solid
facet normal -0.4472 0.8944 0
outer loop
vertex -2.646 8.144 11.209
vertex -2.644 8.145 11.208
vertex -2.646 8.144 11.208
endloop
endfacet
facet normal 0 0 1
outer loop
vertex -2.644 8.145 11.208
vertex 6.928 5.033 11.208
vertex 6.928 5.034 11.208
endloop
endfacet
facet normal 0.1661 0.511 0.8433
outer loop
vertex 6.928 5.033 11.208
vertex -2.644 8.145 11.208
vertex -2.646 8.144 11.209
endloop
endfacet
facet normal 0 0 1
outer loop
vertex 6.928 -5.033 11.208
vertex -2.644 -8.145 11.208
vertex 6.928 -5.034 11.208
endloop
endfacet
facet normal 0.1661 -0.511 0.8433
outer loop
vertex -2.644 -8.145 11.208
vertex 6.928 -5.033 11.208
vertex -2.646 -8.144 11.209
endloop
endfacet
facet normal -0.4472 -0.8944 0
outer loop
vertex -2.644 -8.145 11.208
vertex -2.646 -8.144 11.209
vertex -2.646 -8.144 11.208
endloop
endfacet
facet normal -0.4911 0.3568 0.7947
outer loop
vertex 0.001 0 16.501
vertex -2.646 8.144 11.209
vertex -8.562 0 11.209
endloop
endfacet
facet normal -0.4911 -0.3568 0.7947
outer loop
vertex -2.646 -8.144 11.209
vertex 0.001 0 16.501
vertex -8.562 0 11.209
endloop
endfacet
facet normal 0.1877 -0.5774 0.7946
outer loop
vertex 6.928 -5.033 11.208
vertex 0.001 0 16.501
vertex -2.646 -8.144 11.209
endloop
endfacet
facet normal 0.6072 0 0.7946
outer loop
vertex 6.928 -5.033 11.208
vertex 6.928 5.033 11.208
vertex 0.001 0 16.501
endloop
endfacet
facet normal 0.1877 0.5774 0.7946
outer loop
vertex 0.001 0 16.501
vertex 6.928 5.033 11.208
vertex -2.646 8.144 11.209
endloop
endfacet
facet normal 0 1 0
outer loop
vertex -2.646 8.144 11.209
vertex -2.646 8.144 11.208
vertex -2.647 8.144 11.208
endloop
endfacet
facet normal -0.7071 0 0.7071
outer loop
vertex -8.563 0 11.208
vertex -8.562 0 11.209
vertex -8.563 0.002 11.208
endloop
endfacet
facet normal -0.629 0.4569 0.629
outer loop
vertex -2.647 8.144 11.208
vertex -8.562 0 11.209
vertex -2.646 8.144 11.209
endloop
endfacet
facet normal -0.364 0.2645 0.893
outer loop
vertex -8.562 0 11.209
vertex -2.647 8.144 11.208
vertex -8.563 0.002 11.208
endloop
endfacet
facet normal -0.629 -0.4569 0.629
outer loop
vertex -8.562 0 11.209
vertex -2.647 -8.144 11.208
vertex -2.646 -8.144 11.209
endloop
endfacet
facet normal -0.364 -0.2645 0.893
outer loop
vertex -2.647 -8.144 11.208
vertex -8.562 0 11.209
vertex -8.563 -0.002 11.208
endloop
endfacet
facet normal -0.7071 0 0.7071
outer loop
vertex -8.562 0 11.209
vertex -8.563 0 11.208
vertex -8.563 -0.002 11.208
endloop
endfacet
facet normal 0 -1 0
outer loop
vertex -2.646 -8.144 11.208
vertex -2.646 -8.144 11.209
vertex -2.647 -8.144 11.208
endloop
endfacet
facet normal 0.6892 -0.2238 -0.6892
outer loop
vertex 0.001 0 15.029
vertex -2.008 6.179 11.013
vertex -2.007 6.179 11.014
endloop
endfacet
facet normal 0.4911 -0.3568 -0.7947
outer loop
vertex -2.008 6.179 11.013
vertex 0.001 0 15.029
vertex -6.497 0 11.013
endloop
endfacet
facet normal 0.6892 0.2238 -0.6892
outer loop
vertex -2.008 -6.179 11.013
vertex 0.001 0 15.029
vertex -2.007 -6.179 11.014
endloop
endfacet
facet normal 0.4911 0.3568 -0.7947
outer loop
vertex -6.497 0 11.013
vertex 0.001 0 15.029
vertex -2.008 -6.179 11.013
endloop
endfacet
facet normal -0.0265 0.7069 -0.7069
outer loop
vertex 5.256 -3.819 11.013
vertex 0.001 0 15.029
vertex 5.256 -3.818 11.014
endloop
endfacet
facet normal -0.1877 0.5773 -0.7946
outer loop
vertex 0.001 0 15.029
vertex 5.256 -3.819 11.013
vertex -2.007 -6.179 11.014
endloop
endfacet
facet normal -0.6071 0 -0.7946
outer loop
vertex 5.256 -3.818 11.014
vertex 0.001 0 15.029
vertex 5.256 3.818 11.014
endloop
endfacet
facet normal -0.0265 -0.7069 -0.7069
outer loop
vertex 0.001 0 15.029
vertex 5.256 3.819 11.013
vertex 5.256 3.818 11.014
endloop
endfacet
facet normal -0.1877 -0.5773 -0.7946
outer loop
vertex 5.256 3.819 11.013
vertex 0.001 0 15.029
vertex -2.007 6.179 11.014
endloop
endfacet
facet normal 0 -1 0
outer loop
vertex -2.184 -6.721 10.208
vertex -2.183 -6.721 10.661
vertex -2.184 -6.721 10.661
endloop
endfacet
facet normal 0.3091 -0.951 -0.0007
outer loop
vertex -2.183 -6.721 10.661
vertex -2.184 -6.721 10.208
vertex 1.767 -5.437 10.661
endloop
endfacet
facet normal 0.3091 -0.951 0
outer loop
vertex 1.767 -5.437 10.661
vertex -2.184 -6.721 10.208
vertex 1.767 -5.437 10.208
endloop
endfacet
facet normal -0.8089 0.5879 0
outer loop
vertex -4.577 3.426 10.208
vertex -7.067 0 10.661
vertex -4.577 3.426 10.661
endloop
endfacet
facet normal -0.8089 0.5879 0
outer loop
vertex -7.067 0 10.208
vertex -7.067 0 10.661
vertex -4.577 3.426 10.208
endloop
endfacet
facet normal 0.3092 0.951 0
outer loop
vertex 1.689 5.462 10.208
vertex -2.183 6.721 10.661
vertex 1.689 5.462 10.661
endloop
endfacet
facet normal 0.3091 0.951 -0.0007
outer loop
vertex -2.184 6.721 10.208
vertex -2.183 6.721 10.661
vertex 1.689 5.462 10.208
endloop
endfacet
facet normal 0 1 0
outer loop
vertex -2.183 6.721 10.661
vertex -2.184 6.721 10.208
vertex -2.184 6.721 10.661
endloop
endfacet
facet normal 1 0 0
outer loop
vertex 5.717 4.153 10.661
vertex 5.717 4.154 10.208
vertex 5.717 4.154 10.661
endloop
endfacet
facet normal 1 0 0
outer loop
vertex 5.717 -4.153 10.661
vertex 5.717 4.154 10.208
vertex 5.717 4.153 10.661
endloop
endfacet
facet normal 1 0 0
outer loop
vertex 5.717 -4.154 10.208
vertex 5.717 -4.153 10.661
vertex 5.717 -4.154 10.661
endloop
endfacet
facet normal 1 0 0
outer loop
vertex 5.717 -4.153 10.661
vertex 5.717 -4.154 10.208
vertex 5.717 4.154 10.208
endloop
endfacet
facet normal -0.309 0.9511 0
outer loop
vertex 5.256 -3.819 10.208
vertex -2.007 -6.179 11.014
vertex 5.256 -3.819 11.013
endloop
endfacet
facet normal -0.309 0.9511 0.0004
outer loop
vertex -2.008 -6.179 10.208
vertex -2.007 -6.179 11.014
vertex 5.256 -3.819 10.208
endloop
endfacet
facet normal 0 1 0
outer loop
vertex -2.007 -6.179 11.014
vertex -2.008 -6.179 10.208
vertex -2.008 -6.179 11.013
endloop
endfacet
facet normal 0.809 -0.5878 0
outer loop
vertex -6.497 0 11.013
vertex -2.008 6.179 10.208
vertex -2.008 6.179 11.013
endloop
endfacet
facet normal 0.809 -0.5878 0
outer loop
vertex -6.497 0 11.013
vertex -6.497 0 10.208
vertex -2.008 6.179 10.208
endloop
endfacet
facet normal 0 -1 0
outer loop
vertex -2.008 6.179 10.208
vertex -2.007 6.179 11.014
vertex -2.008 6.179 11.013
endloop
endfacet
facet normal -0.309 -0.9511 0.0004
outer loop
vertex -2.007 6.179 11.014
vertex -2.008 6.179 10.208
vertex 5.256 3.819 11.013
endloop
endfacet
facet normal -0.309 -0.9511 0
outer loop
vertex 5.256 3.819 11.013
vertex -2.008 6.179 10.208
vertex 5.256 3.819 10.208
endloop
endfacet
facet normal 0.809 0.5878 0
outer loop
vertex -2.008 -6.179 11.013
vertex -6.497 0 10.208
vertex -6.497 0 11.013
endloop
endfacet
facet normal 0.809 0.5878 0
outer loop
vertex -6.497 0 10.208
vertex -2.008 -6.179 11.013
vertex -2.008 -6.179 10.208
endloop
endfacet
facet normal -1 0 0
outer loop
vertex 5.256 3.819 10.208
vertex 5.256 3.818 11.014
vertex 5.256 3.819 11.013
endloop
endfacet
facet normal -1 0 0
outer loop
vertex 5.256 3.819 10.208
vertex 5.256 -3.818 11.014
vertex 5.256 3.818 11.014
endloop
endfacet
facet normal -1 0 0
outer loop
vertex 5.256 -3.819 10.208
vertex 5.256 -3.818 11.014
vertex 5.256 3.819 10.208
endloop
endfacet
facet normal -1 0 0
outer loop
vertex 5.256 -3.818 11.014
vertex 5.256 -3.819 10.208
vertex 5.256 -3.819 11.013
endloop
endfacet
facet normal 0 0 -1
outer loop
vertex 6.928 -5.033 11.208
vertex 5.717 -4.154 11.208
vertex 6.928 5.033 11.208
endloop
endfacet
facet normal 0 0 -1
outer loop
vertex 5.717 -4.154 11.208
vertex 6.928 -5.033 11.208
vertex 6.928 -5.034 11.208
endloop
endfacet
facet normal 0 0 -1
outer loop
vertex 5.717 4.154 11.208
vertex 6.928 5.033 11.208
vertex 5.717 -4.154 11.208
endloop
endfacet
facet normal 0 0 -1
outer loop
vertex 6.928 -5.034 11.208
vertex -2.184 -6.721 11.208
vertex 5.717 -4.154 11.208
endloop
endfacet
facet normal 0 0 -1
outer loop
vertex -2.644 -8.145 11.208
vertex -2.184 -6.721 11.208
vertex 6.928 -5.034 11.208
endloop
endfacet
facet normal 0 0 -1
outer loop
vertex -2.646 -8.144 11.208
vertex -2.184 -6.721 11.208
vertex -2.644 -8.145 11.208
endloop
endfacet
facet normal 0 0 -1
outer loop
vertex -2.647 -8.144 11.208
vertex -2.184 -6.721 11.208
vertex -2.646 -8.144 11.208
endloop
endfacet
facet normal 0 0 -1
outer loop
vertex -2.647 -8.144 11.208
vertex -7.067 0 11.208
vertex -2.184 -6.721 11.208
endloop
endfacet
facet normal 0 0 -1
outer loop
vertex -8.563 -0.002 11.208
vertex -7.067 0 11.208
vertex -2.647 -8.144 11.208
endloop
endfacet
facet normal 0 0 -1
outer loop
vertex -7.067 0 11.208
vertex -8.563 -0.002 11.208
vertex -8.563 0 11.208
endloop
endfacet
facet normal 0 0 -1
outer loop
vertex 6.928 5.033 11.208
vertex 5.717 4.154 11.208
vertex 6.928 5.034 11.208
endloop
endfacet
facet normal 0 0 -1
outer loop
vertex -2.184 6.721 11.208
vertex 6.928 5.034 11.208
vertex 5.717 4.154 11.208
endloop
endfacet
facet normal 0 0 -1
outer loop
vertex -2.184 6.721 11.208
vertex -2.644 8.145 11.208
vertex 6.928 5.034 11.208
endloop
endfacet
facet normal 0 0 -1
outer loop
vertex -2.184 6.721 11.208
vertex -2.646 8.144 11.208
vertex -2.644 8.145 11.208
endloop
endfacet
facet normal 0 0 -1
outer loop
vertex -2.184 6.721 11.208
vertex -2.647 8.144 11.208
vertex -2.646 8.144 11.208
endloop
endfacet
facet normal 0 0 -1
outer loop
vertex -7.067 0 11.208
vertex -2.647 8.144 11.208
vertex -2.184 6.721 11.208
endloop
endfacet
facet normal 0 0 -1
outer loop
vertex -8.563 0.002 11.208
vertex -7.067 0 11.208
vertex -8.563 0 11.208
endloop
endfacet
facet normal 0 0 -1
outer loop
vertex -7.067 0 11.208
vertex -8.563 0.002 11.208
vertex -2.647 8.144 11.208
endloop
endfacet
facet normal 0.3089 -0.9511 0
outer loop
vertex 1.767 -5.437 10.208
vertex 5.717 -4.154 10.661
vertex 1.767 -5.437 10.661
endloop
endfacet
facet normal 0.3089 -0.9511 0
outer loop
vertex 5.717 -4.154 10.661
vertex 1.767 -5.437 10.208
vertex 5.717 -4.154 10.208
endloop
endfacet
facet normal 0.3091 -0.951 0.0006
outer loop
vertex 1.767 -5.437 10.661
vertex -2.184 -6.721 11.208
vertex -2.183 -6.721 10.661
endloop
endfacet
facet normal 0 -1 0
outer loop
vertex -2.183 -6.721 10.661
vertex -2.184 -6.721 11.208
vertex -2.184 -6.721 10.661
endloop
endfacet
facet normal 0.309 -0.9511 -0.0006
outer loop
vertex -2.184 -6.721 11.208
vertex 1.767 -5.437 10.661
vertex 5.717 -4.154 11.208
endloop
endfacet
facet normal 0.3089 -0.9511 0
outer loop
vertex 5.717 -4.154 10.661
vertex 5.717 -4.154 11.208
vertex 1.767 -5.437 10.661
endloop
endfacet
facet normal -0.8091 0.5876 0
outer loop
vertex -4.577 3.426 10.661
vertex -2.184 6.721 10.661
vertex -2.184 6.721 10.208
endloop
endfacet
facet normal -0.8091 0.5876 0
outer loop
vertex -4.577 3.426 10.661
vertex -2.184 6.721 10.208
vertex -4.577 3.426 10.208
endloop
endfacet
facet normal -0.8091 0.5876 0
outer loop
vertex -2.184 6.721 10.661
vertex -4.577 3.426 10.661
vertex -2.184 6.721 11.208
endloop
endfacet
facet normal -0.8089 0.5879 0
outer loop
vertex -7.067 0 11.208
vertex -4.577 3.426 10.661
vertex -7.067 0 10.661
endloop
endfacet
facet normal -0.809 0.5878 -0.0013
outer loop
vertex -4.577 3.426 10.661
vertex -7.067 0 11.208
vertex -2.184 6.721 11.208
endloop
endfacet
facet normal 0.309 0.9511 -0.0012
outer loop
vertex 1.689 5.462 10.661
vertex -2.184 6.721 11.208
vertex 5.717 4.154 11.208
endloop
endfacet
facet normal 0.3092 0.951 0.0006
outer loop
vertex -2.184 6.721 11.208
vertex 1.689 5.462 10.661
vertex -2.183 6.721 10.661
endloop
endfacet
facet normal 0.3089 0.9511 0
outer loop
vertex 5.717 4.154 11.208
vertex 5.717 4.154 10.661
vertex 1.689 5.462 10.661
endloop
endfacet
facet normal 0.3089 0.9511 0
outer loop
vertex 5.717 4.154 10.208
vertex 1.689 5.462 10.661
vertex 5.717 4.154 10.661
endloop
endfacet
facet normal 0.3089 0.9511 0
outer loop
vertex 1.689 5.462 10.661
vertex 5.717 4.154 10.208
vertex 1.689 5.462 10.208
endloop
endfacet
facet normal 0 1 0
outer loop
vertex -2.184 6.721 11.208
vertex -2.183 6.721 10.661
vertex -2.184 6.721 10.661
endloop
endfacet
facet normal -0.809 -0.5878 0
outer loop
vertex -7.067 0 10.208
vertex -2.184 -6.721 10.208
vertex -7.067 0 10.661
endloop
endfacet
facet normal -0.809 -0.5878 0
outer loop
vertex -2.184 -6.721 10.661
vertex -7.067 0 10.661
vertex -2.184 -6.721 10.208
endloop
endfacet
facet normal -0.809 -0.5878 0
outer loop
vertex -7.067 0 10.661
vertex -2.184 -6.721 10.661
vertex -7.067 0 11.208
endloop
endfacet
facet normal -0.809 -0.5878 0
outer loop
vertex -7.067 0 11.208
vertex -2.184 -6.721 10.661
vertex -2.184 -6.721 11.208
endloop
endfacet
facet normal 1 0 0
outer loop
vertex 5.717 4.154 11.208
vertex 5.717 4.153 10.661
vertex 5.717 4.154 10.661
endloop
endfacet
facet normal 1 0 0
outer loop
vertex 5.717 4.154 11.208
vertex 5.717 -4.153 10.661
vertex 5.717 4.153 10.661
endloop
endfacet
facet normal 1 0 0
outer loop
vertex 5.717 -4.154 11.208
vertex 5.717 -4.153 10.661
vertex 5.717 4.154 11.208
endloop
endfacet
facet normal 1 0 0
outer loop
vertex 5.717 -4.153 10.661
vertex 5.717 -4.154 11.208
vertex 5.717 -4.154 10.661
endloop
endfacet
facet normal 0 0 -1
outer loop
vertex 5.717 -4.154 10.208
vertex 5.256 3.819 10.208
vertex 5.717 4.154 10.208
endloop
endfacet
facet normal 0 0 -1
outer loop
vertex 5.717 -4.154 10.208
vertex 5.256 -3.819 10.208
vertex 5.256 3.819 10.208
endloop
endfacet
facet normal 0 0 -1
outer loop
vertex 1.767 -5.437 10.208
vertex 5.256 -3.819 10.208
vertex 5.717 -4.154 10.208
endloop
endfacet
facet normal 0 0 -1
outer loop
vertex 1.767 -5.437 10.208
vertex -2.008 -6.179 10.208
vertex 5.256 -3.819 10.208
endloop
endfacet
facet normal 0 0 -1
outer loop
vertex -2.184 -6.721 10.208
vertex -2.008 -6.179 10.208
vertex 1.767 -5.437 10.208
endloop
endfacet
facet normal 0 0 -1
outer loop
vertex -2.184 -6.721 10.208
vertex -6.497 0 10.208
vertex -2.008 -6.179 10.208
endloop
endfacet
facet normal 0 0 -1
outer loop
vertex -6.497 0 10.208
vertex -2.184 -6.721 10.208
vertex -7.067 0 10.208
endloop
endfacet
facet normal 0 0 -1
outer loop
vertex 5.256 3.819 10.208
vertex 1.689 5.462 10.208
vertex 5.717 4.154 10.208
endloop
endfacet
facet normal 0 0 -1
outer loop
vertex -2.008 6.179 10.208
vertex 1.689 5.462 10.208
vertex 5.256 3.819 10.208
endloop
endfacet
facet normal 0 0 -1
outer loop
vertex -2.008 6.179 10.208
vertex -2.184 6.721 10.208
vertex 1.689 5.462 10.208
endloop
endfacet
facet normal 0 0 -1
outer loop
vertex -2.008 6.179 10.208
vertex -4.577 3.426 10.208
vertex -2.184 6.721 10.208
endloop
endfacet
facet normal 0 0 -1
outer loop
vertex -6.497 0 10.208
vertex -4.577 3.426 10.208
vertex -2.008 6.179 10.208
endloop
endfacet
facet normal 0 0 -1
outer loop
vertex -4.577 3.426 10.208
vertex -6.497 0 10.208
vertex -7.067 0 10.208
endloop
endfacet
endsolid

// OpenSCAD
//arete = 21.409;
diameter = 33;
creux = 1; // creux ou plein || 1 ou 0
paroi = 1;
echelleReductionAjustementBouchon = 0.972;
bouchon = 1; // 1 ou 0
corps = 0; // 1 ou 0
rotate_body = 0;
bottom_hole = 1; // 1 ou 0
bottom_hole_diameter = 1.5;
bouchonOffset = 0.4;
r = 0.19; // résolution d'impression sur l'axe Z

// Controle rotation viewport quand animation en route
//$vpr = [70, 0, $t * 180];

/* Forme
Choix parmi:
- 0 => Etoilé
- 1 => Christique
- 2 => Christique_inversé
- 3 => Pentakis // (all points on sphere)
- 4 => Animate // voir plus bas pour plus d'infos
*/
forme_ID = 1;

/////////

function dodeca_ext_radius(a) = 
    a/2*(sqrt(2));
    
function dodeca_inradius(a) = 
    a*sqrt(5/8+11/(8*sqrt(5)));
    
function dodeca_arete_from_inradius(radius) = 
    radius/sqrt(5/8+11/(8*sqrt(5)));
    
function christic_arete_from_external_diameter(diam) =
    diam/(sqrt((5/2)+(11/10)*sqrt(5))+2*sqrt((5-sqrt(5))/10));

// rayon cercle inscrit
function polygon_apothem(arete, sides) =
  arete/(2*tan(180/sides));
  
function polygon_apothem_from_circumradius(circumradius, sides) =
  circumradius*cos(180/sides);
  
function polygon_circumradius_from_apothem(apothem, sides) =
  apothem/cos(180/sides);

arete = christic_arete_from_external_diameter(diameter);
areteInt = dodeca_arete_from_inradius(
            dodeca_inradius(arete)-paroi);
dodeca_inradius = dodeca_inradius(arete);

decoupe_bouchon_radius = polygon_circumradius_from_apothem(
                          polygon_apothem(arete, 5) - paroi+1*r, 
                          5);
bouchon_radius = polygon_circumradius_from_apothem(
                          polygon_apothem(arete, 5) - paroi+1*r - bouchonOffset, 
                          5);

echo("arete: ", arete);
echo("arete int: ", areteInt);
echo(str("dodeca_inradius : ", dodeca_inradius));
echo(str("decoupe_bouchon_radius : ", decoupe_bouchon_radius));
echo(str("bouchon_radius : ", bouchon_radius));

spike = [
    2.3417, // Etoilé, scale 1 is arete = 1.236 mm, diametre = 6.24 mm, arete pyramide = 2 mm
    0.8944, // Christique, scale 1 is arete = 1.236 mm, diametre = 4.05 mm
    -0.8944, // Christique inversé
    0.4279 // Pentakis
];

if (forme_ID == 4) {
    Animate();
} else {  
    if (creux == 0) {
        small_stellated_dodecahedron(spike[forme_ID], small_stellated_dodecahedron);
    } else {
        if (corps == 1) {
          if (rotate_body == 1) {
            rotate([180, 0, 0]) corps_ouvert();
          } else {
            corps_ouvert();
          }
        }
        if (bouchon == 1) {
            bouchon();
        }
    }
}


module corps_ouvert() {

	difference() {
		poly_creux();
		decoupe_bouchon(decoupe_bouchon_radius);
    if (bottom_hole == 1) {
        bottom_hole();
    }
	}
}

module poly_creux() {
    difference() {
        small_stellated_dodecahedron(spike[forme_ID], arete);
        small_stellated_dodecahedron(spike[forme_ID], areteInt);
    }
}

module decoupe_bouchon(radius) {
	rotate([0,0,36]) translate([0,0, dodeca_inradius])
		cylinder(99, r=arete*0.853, $fn=5, center=false);
	rotate([0,0,36]) translate([0,0, dodeca_inradius-paroi])
		#cylinder(paroi, r=radius, $fn=5, center=false);
}

module supplement_feuillure_bouchon() {
    rotate([0,0,36]) translate([0,0, dodeca_inradius-paroi-1])
    difference() {   
		cylinder(paroi+1, r=bouchon_radius, $fn=5, center=false);
		cylinder(paroi+1, r=bouchon_radius-3*r, $fn=5, center=false);
    }
}

module bouchon() {
	difference () {
        intersection() {
            union() {
                poly_creux();
                supplement_feuillure_bouchon();
            }
            decoupe_bouchon(bouchon_radius);
        }
	}
}

module bottom_hole() {
	rotate([0,0,0]) translate([0,0, -dodeca_inradius])
		#cylinder(dodeca_inradius, d=bottom_hole_diameter, $fn=20, center=true);
}

// }}

/*
animates the single parameter of the
module small_stellated_dodecahedron

1/ choose animate in the view menu
2/ sets fps to an appropiate number for
your machine - 20 is good
3/ set steps to a number that keeps the
change from happening too slowly or
too fast - 200 is good
*/
module Animate() {
    small_stellated_dodecahedron(-3.4317*abs(2*$t-1)+2.4317);
}

// Étoilé
// scale 1 is arete = 1.236 mm, diametre = 6.24 mm, arete pyramide = 2 mm
module Etoile(a) {
    small_stellated_dodecahedron(2.3417, a);
}

// Christique
// scale 1 is arete = 1.236 mm, diametre = 4.05 mm
module Christique(a) {
    small_stellated_dodecahedron(0.8944, a);
}

// Christique inversé
module Christique_inv(a) {
    small_stellated_dodecahedron(-0.8944, a);
}

// Pentakis (all points on sphere)
module Pentakis(a) {
    small_stellated_dodecahedron(0.4279, a);
}

module small_stellated_dodecahedron(scale, ar)
{
a=scale*0.61803;
b=scale*0.38197;
    
length = ar ? ar : arete;
echo("length:", length);
// scale(1) => arete 1.236 mm
scale(length/1.236)

// Posé sur 3 pointes
//rotate([20.91, 0, 0])

// Posé sur 1 pointe
rotate([0, 31.72, 0])

/*
constructed from 12 pentagonal pyramids placed
on the faces of a dodecahedron.
first 20 points are the vertices of a dodecahedron
next 12 points are the vertices of the centers
of the faces of the dodecahedron

if scale = 0 a dodecahedron is created

if scale is positive the centers of the
faces are moved out fron the center of the
dodecahedron

if scale is negative the centers of the
faces are moved in towards the center of the
dodecahedron

the apex angles of the triangles that make up
the faces of the stellated dodecahedron
are 36 degrees - the scale factor that
makes a small stellated dodecahedron
is approximately 2.3417
length of side of pentagonal pyramid for
small stellated dodecahedron = 2

the apex angles of the triangles that make up
the faces of a pentakis dodecahedron ( one of
the Catalan solids) are about 68.619 degrees
the scale factor to make one is ca 0.4279

if len = length of the sides of the
pentagonal pyramid then approximately

scale = + or - sqrt((len*len/0.52786) - 2.09443)

lengths of the sides of the base are sqrt(5)-1
or 1.23607 to make equilateral triangles scale
factor is 0.8944

distance from centers of faces to origin ca 1.37638
distance from dodecahedral points to origin sqrt(3)




pcm

*/

polyhedron
       (points = [
                 [   1.00000,   1.00000,   1.00000],
                 [   1.00000,   1.00000,  -1.00000],
                 [   1.00000,  -1.00000,   1.00000],
                 [   1.00000,  -1.00000,  -1.00000],
                 [  -1.00000,   1.00000,   1.00000],
                 [  -1.00000,   1.00000,  -1.00000],
                 [  -1.00000,  -1.00000,   1.00000],
                 [  -1.00000,  -1.00000,  -1.00000],
                 [   0.00000,   0.61803,   1.61803],
                 [   0.00000,   0.61803,  -1.61803],
                 [   0.00000,  -0.61803,   1.61803],
                 [   0.00000,  -0.61803,  -1.61803],
                 [   0.61803,   1.61803,   0.00000],
                 [   0.61803,  -1.61803,   0.00000],
                 [  -0.61803,   1.61803,   0.00000],
                 [  -0.61803,  -1.61803,   0.00000],
                 [   1.61803,   0.00000,   0.61803],
                 [   1.61803,   0.00000,  -0.61803],
                 [  -1.61803,   0.00000,   0.61803],
                 [  -1.61803,   0.00000,  -0.61803],
                 [   1.17082+a,   0.72361+b,   0.00000],
                 [   0.72361+b,   0.00000,   1.17082+a],
                 [   0.00000,   1.17082+a,   0.72361+b],
                 [   0.00000,   1.17082+a,  -0.72361-b],
                 [   0.72361+b,   0.00000,  -1.17082-a],
                 [   1.17082+a,  -0.72361-b,   0.00000],
                 [   0.00000,  -1.17082-a,   0.72361+b],
                 [   0.00000,  -1.17082-a,  -0.72361-b],
                 [  -0.72361-b,   0.00000,   1.17082+a],
                 [  -1.17082-a,   0.72361+b,   0.00000],
                 [  -0.72361-b,   0.00000,  -1.17082-a],
                 [  -1.17082-a,  -0.72361-b,   0.00000],
                   ],

           faces = [

                [0,20,16],[16,20,17],[17,20,1],
                [1,20,12],[12,20,0],
                [0,21,8],[8,21,10],[10,21,2],
                [2,21,16],[16,21,0],
                 [0,22,12],[12,22,14],[14,22,4],
                [4,22,8],[8,22,0],
                [1,23,9],[9,23,5],[5,23,14],
                [14,23,12],[12,23,1],
                [1,24,17],[17,24,3],[3,24,11],
                [11,24,9],[9,24,1],
                [16,25,2],[17,25,16],[3,25,17],
                 [13,25,3],[2,25,13],
                 [2,26,10],[10,26,6],[6,26,15],
                 [15,26,13],[13,26,2],
                 [3,27,13],[13,27,15],[15,27,7],
                 [7,27,11],[11,27,3],
                [4,28,18],[18,28,6],[6,28,10],
                 [10,28,8],[8,28,4],
                 [4,29,14],[14,29,5],[5,29,19],
                 [19,29,18],[18,29,4],
                  [5,30,9],[9,30,11],[11,30,7],
                 [7,30,19],[19,30,5],
                 [6,31,18],[18,31,19],[19,31,7],
                 [7,31,15],[15,31,6],

                 ]
      );
}
